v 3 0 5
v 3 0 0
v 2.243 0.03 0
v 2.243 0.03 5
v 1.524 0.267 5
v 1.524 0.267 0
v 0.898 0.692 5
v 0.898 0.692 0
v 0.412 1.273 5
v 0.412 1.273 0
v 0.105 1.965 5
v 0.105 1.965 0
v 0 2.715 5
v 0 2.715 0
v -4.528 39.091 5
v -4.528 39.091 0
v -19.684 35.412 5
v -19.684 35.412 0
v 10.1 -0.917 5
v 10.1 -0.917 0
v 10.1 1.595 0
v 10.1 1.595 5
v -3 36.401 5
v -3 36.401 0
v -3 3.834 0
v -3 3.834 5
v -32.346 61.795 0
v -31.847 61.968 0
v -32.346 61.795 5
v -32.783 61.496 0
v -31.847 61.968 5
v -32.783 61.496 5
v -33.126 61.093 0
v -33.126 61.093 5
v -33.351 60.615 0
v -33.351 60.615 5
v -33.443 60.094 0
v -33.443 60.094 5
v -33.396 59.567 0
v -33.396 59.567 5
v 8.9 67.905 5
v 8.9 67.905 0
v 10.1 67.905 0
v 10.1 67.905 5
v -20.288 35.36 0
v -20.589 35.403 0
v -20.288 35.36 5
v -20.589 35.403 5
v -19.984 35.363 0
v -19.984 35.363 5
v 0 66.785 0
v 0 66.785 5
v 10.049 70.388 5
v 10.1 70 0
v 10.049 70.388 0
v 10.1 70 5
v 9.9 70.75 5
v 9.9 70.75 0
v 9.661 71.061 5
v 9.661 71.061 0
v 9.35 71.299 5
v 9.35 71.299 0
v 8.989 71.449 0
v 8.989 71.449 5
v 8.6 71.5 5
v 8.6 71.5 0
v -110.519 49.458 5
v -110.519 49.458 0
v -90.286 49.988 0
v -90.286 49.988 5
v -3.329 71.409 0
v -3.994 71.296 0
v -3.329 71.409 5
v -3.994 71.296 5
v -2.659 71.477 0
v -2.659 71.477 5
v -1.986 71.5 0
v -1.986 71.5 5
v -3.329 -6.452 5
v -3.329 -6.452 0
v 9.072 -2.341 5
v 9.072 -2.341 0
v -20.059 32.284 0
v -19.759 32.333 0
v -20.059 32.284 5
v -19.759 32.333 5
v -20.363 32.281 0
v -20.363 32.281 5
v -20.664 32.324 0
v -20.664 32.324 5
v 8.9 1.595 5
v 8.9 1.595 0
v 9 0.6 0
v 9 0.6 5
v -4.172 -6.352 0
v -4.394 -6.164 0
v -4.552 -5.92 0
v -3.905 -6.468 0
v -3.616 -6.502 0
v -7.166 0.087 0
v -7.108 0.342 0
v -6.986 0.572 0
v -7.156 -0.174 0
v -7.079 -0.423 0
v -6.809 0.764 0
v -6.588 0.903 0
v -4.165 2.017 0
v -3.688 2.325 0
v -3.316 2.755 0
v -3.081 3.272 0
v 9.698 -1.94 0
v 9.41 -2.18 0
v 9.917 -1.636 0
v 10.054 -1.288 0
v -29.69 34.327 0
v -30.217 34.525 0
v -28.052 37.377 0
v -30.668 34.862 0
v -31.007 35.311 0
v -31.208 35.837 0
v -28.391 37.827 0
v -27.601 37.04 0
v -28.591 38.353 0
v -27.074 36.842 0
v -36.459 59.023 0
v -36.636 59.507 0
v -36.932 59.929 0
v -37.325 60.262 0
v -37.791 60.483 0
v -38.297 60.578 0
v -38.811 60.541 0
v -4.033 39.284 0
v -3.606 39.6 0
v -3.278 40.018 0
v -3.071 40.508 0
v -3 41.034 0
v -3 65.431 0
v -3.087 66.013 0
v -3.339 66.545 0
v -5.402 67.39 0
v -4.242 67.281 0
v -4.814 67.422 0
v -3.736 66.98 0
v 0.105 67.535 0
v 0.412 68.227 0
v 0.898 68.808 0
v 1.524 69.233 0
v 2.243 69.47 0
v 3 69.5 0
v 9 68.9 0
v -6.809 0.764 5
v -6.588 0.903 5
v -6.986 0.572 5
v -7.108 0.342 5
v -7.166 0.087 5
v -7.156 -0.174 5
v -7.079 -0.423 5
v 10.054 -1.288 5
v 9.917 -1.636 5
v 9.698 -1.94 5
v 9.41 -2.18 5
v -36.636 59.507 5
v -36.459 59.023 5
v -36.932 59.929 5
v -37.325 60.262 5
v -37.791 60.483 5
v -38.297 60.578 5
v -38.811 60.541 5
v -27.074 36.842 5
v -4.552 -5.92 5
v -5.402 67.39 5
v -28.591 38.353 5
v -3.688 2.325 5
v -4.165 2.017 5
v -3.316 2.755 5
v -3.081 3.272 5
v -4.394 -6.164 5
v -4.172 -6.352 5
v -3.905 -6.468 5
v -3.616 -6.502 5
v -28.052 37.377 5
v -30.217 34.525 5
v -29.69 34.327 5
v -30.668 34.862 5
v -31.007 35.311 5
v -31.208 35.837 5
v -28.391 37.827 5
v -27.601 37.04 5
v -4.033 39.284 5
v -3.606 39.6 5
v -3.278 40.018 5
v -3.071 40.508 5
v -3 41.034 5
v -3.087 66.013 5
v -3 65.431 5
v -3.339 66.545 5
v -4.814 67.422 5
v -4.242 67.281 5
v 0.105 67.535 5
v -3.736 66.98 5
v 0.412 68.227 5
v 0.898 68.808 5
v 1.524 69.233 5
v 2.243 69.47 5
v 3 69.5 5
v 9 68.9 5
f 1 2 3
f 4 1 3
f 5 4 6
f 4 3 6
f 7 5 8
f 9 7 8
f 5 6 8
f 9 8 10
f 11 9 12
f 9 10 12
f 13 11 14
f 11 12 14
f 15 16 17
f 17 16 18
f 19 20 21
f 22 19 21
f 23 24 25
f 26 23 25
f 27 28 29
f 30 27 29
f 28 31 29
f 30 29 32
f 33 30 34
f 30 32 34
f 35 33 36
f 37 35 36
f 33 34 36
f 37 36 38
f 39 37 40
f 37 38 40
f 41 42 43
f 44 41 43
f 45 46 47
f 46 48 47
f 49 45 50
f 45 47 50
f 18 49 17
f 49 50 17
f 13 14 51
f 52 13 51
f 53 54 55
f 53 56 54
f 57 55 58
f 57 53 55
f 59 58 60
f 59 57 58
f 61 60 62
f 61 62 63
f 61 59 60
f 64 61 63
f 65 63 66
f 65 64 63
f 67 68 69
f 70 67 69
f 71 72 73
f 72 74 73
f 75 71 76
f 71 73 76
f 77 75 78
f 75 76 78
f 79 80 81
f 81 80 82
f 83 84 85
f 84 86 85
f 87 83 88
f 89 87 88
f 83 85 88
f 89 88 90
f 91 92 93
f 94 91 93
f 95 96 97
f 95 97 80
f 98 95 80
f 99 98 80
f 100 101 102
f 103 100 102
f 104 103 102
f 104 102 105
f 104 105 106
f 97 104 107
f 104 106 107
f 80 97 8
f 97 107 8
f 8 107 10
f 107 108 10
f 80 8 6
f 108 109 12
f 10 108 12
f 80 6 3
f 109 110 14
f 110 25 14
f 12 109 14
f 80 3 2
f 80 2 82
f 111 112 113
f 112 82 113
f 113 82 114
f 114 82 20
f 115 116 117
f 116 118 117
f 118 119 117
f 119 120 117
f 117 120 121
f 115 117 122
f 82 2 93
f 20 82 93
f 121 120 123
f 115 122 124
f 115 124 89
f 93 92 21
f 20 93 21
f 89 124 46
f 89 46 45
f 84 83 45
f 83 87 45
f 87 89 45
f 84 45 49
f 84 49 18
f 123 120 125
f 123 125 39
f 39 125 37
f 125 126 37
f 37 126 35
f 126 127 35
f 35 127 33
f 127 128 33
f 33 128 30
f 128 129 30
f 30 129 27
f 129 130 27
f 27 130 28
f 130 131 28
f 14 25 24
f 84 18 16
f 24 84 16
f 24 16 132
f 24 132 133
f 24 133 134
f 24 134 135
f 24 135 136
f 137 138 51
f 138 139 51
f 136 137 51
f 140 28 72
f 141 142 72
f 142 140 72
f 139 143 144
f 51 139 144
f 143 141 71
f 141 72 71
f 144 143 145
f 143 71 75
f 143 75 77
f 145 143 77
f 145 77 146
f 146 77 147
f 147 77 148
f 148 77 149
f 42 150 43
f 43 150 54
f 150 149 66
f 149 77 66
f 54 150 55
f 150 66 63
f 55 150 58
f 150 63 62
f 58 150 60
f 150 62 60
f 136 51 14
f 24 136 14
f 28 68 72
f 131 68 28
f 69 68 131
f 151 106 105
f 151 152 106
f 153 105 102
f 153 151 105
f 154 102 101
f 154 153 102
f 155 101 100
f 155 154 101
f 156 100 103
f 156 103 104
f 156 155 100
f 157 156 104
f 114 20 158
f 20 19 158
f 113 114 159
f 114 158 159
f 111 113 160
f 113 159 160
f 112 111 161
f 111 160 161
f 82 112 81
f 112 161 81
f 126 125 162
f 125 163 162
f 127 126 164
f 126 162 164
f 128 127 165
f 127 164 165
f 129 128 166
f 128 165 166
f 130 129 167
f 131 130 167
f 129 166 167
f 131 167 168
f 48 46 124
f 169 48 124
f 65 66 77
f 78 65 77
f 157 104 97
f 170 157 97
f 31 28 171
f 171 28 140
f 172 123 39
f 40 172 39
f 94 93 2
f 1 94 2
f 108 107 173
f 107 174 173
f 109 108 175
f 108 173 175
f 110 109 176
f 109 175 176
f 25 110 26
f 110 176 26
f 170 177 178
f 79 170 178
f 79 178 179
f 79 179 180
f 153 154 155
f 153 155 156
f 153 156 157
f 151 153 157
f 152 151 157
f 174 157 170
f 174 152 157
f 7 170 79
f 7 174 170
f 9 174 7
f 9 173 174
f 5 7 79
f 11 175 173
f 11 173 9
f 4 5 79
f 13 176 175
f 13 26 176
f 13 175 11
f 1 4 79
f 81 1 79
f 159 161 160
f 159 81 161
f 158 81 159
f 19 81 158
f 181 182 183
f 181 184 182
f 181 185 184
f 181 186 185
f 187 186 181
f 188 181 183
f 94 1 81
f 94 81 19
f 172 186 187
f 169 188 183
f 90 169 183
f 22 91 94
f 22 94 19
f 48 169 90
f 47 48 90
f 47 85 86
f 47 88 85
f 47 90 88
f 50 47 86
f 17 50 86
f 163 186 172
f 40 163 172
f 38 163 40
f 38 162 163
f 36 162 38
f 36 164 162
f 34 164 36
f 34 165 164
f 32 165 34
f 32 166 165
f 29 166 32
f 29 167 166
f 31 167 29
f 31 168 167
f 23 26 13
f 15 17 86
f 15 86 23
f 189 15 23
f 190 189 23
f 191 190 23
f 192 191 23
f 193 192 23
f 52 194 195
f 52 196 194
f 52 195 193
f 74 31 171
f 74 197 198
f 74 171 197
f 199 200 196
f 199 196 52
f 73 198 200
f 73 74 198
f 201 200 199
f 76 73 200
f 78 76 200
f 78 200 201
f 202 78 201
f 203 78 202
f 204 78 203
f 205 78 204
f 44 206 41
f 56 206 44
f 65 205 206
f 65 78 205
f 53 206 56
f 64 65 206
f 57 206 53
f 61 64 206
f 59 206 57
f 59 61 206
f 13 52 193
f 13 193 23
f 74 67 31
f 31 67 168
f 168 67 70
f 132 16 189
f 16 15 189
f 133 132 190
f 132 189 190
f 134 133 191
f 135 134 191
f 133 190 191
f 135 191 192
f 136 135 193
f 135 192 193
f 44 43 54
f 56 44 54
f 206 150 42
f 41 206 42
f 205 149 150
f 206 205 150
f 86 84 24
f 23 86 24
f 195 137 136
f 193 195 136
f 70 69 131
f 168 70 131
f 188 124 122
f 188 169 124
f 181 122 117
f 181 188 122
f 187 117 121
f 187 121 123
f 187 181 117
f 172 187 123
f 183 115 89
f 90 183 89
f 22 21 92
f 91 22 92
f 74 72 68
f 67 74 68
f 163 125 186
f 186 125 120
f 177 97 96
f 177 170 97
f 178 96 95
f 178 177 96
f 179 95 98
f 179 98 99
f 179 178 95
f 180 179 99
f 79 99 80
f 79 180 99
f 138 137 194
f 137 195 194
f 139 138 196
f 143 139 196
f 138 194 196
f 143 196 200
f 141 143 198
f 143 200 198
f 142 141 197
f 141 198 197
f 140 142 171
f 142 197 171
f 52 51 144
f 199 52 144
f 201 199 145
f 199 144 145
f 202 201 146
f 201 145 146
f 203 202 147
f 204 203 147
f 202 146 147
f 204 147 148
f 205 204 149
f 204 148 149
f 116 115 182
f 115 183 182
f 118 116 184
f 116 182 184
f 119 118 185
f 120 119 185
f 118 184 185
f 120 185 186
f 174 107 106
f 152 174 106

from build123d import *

# Parameters (mm, degrees)
F1_DEPTH = 5
F2_R     = 1.5
F3_R     = 2
F4_R     = 10
F5_R     = 1


with BuildPart() as f1:
    # F0 (on Top) → F1 (new body)
    with BuildSketch(Plane.XY):
        with BuildLine():
            Line((9, 0.6), (3, 0))
            ThreePointArc((3, 0), (0.897663, 0.691907), (0, 2.714963))
            Line((0, 2.714963), (0, 66.785037))
            ThreePointArc((0, 66.785037), (0.897663, 68.808093), (3, 69.5))
            Line((3, 69.5), (9, 68.9))
            Line((9, 68.9), (8.900496, 67.904963))
            Line((8.900496, 67.904963), (10.100496, 67.904963))
            Line((10.100496, 67.904963), (10.100496, 71.5))
            Line((10.100496, 71.5), (-3, 71.5))
            Line((-3, 71.5), (-110.518552, 49.457754))
            Line((-110.518552, 49.457754), (-90.286419, 49.987845))
            Line((-90.286419, 49.987845), (-36.891579, 60.934255))
            Line((-36.891579, 60.934255), (-30.92766, 34.601165))
            Line((-30.92766, 34.601165), (-20.210214, 32.223703))
            Line((-20.210214, 32.223703), (-3, 36.40078))
            Line((-3, 36.40078), (-3, 2.552214))
            Line((-3, 2.552214), (-7.496703, 0.485405))
            Line((-7.496703, 0.485405), (-4.178624, -6.733656))
            Line((-4.178624, -6.733656), (10.100496, -2))
            Line((10.100496, -2), (10.100496, 1.595037))
            Line((10.100496, 1.595037), (8.900496, 1.595037))
            Line((8.900496, 1.595037), (9, 0.6))
        make_face()
        Polygon((-28.311197, 37.116512), (-33.84681, 61.55846), (-3, 67.882326), (-3, 39.46185), (-20.135539, 35.302897), align=None, mode=Mode.SUBTRACT)
    extrude(amount=F1_DEPTH)

    # F2
    f2_edges = [f1.edges().sort_by_distance(p)[0] for p in [
        (10.100496, 71.5, 2.5),
        (10.100496, -2, 2.5),
    ]]
    fillet(f2_edges, radius=F2_R)

    # F3
    f3_edges = [f1.edges().sort_by_distance(p)[0] for p in [
        (-3, 2.552214, 2.5),
        (-3, 39.46185, 2.5),
        (-20.135539, 35.302897, 2.5),
        (-28.311197, 37.116512, 2.5),
        (-33.84681, 61.55846, 2.5),
        (-3, 67.882326, 2.5),
        (-36.891579, 60.934255, 2.5),
        (-30.92766, 34.601165, 2.5),
        (-20.210214, 32.223703, 2.5),
    ]]
    fillet(f3_edges, radius=F3_R)

    # F4
    f4_edges = [f1.edges().sort_by_distance(p)[0] for p in [
        (-3, 71.5, 2.5),
    ]]
    fillet(f4_edges, radius=F4_R)

    # F5
    f5_edges = [f1.edges().sort_by_distance(p)[0] for p in [
        (-4.178624, -6.733656, 2.5),
        (-7.496703, 0.485405, 2.5),
    ]]
    fillet(f5_edges, radius=F5_R)


solid = f1.part
